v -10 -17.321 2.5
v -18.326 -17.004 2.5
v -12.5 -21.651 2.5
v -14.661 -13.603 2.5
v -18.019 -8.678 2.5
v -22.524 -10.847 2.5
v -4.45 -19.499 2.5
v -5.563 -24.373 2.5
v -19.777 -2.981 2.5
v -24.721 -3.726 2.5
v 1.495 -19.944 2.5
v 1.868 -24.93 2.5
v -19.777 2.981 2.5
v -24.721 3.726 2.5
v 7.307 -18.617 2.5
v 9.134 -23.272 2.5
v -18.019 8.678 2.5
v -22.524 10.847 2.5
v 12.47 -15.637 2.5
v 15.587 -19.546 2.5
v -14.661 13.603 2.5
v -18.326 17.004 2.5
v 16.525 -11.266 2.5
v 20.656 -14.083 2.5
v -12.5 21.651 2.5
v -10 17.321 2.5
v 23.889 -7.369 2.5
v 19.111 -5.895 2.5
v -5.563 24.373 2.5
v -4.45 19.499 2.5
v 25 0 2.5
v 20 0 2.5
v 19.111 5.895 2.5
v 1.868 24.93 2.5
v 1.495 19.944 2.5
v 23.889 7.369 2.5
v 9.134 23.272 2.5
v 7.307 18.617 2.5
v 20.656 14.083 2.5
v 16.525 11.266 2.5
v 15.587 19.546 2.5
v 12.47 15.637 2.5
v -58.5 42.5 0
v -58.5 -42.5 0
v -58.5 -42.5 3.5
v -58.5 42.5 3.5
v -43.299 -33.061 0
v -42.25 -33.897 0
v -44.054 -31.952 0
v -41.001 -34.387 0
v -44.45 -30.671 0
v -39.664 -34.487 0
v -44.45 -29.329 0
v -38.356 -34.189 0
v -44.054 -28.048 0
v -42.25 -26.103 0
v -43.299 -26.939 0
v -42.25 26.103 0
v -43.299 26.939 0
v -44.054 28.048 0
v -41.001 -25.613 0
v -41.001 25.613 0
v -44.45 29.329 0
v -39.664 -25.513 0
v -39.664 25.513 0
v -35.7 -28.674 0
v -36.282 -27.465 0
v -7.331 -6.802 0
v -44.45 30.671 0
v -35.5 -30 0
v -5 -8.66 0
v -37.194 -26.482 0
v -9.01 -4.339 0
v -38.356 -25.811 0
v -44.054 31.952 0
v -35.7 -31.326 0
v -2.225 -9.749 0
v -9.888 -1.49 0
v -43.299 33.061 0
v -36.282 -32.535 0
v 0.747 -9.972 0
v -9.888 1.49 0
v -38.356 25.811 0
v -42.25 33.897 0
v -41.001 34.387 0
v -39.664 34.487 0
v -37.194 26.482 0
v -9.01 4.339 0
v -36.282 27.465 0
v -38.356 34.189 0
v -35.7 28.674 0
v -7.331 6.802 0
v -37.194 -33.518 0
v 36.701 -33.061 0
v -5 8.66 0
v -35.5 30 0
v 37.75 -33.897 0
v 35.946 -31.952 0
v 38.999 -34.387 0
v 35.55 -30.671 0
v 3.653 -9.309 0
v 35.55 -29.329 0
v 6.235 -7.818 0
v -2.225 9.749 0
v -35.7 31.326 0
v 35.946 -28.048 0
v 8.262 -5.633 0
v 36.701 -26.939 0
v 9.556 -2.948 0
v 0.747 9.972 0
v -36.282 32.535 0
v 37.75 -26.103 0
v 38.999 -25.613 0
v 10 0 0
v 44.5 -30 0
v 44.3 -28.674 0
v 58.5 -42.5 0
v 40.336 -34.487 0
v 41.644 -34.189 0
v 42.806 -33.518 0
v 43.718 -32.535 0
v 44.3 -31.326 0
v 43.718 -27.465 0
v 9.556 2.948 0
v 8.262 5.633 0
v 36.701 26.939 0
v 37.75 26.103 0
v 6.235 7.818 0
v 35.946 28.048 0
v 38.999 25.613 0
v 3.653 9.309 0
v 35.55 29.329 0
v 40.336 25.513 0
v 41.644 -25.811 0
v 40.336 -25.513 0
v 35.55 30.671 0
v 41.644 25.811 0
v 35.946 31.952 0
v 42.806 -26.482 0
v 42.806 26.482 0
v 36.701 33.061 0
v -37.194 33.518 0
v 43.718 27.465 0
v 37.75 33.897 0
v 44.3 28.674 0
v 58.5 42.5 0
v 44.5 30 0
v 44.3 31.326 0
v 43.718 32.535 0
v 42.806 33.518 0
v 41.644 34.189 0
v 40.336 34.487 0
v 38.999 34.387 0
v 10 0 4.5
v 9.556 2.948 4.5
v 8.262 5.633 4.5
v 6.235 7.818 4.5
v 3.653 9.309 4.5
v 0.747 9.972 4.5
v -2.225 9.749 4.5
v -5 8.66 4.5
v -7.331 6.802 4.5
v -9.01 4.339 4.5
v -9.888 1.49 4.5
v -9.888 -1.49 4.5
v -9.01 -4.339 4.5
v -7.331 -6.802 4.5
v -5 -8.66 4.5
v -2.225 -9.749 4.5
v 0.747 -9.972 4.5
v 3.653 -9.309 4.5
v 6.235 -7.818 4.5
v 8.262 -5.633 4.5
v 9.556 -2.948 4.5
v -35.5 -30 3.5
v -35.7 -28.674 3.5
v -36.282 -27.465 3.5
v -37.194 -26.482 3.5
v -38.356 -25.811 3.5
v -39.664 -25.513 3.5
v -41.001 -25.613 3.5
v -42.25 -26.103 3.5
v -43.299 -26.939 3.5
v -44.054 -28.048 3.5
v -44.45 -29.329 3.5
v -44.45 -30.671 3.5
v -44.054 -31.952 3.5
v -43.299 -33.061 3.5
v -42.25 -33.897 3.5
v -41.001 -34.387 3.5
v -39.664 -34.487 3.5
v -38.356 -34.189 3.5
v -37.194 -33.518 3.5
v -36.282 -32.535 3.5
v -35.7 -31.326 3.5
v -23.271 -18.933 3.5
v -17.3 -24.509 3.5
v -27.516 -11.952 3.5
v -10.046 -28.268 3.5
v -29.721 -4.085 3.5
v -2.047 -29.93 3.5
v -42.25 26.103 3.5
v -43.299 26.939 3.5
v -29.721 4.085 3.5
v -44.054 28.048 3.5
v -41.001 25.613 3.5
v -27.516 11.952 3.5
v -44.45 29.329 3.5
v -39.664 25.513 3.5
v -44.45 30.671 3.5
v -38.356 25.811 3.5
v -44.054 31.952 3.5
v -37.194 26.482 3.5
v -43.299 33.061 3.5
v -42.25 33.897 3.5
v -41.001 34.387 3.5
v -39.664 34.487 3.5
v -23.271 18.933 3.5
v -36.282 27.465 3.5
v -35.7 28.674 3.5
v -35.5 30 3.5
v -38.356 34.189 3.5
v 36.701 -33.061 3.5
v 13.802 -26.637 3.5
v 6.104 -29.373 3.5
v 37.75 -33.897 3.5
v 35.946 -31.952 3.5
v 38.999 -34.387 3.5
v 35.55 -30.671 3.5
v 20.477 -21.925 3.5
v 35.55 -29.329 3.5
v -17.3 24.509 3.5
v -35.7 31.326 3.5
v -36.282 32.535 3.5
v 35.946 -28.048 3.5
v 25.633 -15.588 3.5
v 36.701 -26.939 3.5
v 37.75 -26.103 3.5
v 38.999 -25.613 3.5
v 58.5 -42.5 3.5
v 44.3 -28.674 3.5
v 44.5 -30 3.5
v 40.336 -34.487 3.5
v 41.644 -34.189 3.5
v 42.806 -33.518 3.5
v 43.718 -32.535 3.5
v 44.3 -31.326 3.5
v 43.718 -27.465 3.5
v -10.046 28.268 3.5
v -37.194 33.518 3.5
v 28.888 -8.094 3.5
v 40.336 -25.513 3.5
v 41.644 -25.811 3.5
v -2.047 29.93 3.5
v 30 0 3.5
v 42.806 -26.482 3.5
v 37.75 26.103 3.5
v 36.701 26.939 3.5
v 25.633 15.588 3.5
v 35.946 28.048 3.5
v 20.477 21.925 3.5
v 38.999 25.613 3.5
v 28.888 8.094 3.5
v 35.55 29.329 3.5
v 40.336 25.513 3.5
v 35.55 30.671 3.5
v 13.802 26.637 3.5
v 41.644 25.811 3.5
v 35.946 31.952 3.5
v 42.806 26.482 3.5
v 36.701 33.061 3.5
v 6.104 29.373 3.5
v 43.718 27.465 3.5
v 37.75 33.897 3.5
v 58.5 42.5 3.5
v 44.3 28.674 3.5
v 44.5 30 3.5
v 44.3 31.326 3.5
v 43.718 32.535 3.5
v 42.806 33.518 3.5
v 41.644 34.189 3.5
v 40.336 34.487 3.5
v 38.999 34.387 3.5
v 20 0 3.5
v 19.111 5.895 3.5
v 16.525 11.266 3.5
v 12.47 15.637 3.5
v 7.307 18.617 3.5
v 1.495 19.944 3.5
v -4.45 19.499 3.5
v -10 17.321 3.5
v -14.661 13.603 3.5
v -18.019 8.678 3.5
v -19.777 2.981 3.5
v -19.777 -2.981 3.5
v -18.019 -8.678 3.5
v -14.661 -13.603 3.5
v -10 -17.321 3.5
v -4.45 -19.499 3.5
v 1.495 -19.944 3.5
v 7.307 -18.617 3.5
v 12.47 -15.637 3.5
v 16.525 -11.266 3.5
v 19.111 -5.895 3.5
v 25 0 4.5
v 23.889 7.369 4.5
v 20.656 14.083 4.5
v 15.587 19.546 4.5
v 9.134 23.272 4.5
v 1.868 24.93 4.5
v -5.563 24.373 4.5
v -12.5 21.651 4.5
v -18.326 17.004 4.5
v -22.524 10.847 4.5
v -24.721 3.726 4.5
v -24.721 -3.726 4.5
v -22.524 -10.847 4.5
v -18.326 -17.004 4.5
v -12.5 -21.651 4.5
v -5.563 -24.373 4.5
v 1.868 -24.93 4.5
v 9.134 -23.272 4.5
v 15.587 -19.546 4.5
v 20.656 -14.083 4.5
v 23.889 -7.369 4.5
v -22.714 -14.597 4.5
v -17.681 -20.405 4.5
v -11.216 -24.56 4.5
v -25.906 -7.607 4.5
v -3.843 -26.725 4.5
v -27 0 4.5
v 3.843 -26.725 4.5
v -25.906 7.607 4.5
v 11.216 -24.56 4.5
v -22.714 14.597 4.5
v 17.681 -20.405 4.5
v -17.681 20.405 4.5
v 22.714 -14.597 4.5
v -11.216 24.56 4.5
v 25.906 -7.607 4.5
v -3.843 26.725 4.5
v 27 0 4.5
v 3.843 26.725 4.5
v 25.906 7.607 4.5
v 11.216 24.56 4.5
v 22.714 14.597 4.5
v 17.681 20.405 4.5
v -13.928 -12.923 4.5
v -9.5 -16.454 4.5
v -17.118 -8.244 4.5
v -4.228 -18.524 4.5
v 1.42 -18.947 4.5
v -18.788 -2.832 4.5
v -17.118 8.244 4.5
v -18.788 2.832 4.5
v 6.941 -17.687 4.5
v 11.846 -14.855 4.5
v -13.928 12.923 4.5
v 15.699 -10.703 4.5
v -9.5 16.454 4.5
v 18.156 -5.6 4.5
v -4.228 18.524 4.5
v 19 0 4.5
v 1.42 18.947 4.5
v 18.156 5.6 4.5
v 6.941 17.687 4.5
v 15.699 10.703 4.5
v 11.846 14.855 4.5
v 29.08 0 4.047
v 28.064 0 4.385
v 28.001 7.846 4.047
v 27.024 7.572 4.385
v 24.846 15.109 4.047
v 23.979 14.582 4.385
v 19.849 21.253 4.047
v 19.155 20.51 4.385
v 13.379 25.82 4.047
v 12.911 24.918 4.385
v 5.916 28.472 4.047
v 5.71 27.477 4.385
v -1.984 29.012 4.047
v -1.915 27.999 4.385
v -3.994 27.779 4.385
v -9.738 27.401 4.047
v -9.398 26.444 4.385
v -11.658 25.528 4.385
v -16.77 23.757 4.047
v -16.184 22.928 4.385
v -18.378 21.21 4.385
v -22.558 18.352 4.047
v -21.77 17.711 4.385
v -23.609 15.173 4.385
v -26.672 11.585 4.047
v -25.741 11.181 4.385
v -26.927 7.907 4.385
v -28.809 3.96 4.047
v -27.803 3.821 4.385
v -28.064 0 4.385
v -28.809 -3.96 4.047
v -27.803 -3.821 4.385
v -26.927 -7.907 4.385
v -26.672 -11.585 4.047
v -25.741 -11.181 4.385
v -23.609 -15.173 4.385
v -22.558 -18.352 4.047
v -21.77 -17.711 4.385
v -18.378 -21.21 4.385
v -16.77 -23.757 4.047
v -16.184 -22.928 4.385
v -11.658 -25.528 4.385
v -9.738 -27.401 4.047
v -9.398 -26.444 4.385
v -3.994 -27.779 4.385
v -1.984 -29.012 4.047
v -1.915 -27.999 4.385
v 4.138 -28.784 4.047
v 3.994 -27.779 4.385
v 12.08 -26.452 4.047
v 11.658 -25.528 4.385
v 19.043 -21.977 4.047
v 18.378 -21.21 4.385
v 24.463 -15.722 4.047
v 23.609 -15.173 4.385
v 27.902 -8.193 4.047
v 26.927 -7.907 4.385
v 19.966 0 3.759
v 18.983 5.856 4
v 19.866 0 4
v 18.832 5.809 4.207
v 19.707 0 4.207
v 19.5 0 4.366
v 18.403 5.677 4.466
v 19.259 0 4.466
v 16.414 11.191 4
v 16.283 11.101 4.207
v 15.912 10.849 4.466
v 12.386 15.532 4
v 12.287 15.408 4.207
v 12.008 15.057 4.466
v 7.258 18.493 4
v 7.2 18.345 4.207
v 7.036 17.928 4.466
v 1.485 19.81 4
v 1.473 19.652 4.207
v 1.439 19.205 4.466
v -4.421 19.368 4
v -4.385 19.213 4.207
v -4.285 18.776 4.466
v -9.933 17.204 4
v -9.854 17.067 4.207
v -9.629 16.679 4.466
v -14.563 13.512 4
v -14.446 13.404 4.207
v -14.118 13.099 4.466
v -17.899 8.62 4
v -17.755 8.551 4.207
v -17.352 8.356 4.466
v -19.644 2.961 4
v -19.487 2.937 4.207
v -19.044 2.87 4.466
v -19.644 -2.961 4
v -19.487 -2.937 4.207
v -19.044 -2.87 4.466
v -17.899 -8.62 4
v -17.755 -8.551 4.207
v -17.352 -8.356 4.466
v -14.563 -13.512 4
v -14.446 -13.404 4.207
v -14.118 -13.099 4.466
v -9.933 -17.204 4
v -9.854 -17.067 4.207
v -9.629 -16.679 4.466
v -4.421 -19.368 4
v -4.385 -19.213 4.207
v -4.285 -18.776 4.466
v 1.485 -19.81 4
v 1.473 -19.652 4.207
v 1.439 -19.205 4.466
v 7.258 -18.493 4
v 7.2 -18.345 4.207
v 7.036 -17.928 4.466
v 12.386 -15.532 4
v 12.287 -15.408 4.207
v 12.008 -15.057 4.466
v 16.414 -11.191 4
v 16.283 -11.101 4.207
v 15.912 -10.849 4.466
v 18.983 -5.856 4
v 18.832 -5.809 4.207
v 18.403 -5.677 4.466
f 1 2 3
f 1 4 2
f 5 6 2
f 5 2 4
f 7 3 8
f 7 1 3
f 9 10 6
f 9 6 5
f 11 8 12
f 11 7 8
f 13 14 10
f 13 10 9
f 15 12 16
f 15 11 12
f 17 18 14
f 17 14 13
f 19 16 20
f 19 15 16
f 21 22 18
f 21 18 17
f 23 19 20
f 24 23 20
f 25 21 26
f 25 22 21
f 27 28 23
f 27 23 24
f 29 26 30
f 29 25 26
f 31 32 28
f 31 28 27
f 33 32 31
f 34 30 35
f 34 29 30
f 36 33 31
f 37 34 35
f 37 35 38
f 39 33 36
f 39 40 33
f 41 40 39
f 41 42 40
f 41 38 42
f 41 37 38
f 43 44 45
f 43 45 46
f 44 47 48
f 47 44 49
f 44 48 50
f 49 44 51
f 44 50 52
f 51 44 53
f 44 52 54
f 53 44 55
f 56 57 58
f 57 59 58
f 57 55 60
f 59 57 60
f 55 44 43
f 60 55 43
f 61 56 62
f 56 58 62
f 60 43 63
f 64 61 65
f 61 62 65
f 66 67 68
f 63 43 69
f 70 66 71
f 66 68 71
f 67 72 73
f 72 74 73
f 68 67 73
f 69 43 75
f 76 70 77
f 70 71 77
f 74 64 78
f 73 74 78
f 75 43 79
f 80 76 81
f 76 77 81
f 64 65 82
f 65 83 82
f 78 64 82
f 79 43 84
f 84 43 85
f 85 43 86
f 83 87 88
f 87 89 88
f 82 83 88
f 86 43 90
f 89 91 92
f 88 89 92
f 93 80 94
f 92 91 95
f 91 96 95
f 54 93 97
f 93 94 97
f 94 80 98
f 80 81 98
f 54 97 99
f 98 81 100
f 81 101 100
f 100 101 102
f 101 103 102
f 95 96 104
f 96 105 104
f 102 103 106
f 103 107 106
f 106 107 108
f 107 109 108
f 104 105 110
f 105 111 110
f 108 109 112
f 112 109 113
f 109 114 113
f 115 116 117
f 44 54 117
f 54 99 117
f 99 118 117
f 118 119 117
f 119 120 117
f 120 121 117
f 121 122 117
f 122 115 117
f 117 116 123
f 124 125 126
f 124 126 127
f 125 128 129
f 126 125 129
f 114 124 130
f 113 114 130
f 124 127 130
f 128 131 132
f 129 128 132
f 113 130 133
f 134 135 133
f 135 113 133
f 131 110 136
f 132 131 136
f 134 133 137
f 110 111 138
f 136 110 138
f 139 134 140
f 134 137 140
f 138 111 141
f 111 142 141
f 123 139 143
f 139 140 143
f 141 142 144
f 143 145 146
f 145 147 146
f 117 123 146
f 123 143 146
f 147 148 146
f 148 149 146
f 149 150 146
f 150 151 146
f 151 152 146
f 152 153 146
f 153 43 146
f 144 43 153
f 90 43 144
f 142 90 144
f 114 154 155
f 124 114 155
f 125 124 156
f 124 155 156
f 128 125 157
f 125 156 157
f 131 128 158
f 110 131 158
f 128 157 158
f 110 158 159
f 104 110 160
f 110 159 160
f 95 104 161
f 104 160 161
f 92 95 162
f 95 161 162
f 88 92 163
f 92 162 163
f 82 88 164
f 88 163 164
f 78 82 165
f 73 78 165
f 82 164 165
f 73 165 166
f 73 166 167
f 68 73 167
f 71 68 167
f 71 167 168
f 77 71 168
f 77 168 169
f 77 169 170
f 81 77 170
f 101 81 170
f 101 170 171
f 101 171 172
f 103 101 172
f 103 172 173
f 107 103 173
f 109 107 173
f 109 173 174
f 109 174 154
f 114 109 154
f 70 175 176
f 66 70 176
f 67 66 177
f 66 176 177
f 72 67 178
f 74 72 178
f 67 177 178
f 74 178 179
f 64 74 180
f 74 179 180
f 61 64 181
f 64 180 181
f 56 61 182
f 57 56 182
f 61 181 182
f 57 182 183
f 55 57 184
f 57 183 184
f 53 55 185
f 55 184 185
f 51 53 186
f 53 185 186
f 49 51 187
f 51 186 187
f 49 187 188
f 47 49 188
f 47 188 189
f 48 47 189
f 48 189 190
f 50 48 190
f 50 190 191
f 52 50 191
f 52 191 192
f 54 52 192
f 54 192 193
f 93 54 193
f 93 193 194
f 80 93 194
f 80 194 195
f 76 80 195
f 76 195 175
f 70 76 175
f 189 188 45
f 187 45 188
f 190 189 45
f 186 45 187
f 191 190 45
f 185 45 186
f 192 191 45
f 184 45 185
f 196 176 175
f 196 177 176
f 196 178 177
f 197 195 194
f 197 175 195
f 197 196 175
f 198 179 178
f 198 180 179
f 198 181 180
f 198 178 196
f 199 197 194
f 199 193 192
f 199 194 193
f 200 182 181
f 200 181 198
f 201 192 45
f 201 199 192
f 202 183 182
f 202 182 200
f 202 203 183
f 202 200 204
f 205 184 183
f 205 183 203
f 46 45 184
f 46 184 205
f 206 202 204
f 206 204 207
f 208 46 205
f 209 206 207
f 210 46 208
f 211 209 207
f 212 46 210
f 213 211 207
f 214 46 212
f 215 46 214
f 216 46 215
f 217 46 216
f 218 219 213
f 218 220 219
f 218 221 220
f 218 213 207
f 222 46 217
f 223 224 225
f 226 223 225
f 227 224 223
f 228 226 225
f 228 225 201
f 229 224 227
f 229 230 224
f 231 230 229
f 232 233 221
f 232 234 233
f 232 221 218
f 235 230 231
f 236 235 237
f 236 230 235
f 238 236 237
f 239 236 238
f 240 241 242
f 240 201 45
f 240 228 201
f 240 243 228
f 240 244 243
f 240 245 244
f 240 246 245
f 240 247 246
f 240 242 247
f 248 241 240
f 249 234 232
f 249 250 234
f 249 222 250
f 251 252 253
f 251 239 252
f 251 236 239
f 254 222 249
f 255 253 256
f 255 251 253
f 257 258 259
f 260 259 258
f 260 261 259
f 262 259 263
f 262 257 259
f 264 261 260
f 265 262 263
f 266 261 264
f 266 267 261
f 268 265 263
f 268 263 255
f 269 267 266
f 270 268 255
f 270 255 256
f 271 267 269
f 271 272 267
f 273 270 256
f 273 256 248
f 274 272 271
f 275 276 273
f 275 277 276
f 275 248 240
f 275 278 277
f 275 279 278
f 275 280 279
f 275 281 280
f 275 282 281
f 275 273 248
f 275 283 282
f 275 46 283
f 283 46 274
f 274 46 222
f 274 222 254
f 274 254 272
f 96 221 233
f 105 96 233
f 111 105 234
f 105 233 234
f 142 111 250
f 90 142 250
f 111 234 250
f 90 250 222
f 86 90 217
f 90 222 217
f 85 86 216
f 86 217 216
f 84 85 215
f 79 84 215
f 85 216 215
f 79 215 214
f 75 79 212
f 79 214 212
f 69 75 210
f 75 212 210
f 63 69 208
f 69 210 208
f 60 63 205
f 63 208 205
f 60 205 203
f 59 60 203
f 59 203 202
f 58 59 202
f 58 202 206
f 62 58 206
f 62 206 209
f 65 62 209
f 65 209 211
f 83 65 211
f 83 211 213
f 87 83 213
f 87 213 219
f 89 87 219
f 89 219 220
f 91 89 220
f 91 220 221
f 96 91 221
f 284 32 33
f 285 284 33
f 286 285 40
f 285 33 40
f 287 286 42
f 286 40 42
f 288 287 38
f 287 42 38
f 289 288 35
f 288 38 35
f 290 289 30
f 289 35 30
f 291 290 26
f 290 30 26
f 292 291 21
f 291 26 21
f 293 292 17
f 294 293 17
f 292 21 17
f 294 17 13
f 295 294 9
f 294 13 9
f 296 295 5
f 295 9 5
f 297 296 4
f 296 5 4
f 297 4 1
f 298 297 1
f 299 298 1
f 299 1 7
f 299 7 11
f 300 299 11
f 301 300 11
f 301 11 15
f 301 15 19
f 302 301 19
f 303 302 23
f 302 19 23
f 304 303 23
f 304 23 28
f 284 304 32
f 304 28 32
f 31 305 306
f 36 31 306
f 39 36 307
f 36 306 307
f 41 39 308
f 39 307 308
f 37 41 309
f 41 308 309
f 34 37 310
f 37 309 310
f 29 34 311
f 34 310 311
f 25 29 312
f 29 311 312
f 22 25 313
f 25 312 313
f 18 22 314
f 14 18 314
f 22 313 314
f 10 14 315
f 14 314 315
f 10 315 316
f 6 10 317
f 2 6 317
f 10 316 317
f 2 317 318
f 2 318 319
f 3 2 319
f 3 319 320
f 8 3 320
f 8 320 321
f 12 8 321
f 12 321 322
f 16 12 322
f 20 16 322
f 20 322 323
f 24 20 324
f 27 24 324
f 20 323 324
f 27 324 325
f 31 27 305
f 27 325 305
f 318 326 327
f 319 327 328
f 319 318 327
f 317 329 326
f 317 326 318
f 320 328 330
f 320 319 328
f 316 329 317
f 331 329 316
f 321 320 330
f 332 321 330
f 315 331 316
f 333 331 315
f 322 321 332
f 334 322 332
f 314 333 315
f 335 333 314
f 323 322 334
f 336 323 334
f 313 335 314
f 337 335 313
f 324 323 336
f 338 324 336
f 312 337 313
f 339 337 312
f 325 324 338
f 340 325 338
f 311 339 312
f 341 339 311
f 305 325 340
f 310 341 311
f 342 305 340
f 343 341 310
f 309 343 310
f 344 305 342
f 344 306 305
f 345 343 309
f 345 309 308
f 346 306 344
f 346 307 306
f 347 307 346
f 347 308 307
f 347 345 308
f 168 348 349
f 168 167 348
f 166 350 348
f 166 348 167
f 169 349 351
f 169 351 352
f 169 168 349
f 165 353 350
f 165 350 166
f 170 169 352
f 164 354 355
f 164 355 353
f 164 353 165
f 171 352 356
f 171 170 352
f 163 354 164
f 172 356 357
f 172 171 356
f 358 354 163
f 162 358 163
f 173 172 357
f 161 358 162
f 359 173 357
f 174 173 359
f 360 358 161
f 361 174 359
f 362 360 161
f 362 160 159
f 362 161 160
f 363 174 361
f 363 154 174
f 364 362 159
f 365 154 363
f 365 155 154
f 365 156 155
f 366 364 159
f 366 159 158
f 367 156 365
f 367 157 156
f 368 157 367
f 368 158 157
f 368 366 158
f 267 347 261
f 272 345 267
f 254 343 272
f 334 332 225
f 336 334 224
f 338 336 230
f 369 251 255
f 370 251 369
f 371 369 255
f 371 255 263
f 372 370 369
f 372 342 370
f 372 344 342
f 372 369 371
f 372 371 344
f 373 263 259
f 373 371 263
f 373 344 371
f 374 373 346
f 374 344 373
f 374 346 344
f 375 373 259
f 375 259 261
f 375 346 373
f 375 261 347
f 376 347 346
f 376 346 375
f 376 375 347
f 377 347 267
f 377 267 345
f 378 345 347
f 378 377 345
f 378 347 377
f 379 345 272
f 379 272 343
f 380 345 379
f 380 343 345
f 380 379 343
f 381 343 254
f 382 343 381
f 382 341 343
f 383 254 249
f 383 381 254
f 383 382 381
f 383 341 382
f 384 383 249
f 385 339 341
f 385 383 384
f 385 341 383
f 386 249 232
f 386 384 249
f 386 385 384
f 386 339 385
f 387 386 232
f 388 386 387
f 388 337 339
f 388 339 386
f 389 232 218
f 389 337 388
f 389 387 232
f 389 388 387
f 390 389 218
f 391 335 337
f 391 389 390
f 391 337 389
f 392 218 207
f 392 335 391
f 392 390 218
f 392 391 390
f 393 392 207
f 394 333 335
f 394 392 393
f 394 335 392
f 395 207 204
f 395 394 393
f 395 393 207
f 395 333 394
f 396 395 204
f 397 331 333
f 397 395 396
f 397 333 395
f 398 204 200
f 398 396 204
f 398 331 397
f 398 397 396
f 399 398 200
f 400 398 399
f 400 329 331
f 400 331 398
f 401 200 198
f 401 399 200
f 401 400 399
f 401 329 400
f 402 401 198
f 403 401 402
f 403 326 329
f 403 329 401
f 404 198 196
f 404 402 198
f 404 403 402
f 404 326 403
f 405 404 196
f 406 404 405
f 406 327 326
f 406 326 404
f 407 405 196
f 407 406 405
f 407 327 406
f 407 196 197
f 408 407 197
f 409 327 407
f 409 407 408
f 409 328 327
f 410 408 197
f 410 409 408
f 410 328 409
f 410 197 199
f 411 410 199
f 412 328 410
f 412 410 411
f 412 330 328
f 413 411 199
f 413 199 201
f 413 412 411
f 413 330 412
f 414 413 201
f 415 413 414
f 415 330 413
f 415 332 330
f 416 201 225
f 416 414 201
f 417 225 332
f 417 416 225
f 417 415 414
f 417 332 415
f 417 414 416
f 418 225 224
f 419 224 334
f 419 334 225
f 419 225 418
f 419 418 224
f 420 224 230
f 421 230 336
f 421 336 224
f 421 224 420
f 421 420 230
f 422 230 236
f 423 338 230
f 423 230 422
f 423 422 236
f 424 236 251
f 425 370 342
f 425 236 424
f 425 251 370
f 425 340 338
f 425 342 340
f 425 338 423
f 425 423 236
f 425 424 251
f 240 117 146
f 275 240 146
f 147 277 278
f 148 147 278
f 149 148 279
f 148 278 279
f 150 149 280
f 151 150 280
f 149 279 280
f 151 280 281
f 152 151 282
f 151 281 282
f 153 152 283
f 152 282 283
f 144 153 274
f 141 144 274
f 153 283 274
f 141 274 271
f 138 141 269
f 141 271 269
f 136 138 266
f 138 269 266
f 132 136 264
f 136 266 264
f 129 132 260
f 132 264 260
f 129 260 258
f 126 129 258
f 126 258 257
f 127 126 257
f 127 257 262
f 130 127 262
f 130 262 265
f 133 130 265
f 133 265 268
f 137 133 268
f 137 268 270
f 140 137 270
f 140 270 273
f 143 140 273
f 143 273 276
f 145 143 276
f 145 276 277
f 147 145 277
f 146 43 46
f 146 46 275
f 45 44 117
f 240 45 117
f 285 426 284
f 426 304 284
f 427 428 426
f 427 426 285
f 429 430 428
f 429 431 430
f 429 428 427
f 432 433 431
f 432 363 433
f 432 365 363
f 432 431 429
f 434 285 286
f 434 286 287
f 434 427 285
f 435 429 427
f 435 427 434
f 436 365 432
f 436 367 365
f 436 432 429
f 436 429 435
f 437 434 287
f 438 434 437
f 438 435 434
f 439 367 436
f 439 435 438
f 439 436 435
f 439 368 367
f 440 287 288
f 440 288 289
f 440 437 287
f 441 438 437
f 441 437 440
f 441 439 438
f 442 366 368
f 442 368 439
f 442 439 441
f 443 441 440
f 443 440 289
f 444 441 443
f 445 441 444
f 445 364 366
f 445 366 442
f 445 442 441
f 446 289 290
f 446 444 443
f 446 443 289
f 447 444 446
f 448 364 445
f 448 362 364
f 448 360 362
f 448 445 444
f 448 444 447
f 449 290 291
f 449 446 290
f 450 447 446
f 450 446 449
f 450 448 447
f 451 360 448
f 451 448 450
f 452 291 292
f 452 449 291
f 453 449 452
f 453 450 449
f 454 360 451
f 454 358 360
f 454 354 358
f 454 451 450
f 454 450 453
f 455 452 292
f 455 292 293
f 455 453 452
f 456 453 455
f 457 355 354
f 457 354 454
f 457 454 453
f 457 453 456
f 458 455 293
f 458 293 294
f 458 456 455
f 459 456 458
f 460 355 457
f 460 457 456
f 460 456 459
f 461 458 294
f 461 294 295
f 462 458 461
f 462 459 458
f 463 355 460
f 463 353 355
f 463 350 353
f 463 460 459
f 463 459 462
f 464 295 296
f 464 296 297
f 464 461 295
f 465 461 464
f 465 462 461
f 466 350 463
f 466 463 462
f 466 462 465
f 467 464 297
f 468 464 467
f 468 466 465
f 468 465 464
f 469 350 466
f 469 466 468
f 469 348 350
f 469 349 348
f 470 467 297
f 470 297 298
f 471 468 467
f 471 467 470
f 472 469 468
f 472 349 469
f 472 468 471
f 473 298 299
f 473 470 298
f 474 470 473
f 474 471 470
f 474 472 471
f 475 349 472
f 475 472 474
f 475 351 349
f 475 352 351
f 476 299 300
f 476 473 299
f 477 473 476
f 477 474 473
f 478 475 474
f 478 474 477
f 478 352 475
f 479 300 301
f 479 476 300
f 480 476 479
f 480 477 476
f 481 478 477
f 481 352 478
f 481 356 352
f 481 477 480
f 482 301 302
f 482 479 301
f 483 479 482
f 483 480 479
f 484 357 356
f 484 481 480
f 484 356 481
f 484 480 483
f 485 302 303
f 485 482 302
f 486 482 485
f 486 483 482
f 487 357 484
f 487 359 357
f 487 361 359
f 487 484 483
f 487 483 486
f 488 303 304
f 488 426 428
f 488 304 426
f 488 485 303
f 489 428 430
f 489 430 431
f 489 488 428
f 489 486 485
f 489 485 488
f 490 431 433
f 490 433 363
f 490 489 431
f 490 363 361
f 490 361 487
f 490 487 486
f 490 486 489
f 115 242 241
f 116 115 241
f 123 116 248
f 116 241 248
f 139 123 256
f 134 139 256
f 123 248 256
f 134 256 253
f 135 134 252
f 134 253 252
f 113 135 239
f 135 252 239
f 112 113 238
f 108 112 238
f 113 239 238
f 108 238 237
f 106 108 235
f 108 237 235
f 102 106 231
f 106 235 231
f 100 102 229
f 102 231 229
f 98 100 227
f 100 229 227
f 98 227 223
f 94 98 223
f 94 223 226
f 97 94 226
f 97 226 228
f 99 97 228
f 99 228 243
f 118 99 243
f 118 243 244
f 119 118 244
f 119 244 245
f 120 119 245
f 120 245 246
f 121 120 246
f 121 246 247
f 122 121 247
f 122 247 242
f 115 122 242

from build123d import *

# Parameters (mm, degrees)
F0_W      = 117
F0_H      = 85
F1_DEPTH  = 3.5
F2_R      = 4.5
F3_DEPTH  = 25
F4_R      = 30
F5_DEPTH  = 1
F7_R      = 25
F8_DEPTH  = 2
F9_R      = 20
F10_DEPTH = 2
F11_R     = 1
F12_R     = 10
F13_DEPTH = 25


# Not quite as in the source:
# - a fillet or chamfer that OpenCascade refuses, or shapes differently, is made with other operations: its cross-section is extruded or revolved along the edge and cut away or added


with BuildPart() as f1:
    # F0 (on Top) → F1 (new body)
    with BuildSketch(Plane.XY):
        Rectangle(F0_W, F0_H)
    extrude(amount=F1_DEPTH)

    # F2 (on face) → F3 (cut)
    with BuildSketch(Plane.XY.offset(3.5)):
        with Locations((40, 30)):
            Circle(F2_R)
        with Locations((-40, 30)):
            Circle(F2_R)
        with Locations((-40, -30)):
            Circle(F2_R)
        with Locations((40, -30)):
            Circle(F2_R)
    extrude(amount=-F3_DEPTH, mode=Mode.SUBTRACT)

    # F4 (on face) → F5 (join)
    with BuildSketch(Plane.XY.offset(3.5)):
        Circle(F4_R)
    extrude(amount=F5_DEPTH)

    # F6: fillet of radius 5 on 1 edges, made by hand

    # F6_s1 → F6_t2 (revolve, cut)
    with BuildSketch(Plane.XZ):
        with BuildLine():
            ThreePointArc((30, 3.5), (28.5811388301, 4.2434164903), (27, 4.5))
            Line((27, 4.5), (30, 4.5))
            Line((30, 4.5), (30, 3.5))
        make_face()
    revolve(axis=Axis((0, 0, 4.5), (0, 0, 1)), mode=Mode.SUBTRACT)

    # F7 (on face) → F8 (cut)
    with BuildSketch(Plane.XY.offset(4.5)):
        Circle(F7_R)
    extrude(amount=-F8_DEPTH, mode=Mode.SUBTRACT)

    # F9 (on face) → F10 (join)
    with BuildSketch(Plane.XY.offset(2.5)):
        Circle(F9_R)
    extrude(amount=F10_DEPTH)

    # F11
    f11_edges = [f1.edges().sort_by_distance(p)[0] for p in [
        (-20, 0, 4.5),
    ]]
    fillet(f11_edges, radius=F11_R)

    # F12 (on face) → F13 (cut)
    with BuildSketch(Plane.XY.offset(4.5)):
        Circle(F12_R)
    extrude(amount=-F13_DEPTH, mode=Mode.SUBTRACT)


solid = f1.part
